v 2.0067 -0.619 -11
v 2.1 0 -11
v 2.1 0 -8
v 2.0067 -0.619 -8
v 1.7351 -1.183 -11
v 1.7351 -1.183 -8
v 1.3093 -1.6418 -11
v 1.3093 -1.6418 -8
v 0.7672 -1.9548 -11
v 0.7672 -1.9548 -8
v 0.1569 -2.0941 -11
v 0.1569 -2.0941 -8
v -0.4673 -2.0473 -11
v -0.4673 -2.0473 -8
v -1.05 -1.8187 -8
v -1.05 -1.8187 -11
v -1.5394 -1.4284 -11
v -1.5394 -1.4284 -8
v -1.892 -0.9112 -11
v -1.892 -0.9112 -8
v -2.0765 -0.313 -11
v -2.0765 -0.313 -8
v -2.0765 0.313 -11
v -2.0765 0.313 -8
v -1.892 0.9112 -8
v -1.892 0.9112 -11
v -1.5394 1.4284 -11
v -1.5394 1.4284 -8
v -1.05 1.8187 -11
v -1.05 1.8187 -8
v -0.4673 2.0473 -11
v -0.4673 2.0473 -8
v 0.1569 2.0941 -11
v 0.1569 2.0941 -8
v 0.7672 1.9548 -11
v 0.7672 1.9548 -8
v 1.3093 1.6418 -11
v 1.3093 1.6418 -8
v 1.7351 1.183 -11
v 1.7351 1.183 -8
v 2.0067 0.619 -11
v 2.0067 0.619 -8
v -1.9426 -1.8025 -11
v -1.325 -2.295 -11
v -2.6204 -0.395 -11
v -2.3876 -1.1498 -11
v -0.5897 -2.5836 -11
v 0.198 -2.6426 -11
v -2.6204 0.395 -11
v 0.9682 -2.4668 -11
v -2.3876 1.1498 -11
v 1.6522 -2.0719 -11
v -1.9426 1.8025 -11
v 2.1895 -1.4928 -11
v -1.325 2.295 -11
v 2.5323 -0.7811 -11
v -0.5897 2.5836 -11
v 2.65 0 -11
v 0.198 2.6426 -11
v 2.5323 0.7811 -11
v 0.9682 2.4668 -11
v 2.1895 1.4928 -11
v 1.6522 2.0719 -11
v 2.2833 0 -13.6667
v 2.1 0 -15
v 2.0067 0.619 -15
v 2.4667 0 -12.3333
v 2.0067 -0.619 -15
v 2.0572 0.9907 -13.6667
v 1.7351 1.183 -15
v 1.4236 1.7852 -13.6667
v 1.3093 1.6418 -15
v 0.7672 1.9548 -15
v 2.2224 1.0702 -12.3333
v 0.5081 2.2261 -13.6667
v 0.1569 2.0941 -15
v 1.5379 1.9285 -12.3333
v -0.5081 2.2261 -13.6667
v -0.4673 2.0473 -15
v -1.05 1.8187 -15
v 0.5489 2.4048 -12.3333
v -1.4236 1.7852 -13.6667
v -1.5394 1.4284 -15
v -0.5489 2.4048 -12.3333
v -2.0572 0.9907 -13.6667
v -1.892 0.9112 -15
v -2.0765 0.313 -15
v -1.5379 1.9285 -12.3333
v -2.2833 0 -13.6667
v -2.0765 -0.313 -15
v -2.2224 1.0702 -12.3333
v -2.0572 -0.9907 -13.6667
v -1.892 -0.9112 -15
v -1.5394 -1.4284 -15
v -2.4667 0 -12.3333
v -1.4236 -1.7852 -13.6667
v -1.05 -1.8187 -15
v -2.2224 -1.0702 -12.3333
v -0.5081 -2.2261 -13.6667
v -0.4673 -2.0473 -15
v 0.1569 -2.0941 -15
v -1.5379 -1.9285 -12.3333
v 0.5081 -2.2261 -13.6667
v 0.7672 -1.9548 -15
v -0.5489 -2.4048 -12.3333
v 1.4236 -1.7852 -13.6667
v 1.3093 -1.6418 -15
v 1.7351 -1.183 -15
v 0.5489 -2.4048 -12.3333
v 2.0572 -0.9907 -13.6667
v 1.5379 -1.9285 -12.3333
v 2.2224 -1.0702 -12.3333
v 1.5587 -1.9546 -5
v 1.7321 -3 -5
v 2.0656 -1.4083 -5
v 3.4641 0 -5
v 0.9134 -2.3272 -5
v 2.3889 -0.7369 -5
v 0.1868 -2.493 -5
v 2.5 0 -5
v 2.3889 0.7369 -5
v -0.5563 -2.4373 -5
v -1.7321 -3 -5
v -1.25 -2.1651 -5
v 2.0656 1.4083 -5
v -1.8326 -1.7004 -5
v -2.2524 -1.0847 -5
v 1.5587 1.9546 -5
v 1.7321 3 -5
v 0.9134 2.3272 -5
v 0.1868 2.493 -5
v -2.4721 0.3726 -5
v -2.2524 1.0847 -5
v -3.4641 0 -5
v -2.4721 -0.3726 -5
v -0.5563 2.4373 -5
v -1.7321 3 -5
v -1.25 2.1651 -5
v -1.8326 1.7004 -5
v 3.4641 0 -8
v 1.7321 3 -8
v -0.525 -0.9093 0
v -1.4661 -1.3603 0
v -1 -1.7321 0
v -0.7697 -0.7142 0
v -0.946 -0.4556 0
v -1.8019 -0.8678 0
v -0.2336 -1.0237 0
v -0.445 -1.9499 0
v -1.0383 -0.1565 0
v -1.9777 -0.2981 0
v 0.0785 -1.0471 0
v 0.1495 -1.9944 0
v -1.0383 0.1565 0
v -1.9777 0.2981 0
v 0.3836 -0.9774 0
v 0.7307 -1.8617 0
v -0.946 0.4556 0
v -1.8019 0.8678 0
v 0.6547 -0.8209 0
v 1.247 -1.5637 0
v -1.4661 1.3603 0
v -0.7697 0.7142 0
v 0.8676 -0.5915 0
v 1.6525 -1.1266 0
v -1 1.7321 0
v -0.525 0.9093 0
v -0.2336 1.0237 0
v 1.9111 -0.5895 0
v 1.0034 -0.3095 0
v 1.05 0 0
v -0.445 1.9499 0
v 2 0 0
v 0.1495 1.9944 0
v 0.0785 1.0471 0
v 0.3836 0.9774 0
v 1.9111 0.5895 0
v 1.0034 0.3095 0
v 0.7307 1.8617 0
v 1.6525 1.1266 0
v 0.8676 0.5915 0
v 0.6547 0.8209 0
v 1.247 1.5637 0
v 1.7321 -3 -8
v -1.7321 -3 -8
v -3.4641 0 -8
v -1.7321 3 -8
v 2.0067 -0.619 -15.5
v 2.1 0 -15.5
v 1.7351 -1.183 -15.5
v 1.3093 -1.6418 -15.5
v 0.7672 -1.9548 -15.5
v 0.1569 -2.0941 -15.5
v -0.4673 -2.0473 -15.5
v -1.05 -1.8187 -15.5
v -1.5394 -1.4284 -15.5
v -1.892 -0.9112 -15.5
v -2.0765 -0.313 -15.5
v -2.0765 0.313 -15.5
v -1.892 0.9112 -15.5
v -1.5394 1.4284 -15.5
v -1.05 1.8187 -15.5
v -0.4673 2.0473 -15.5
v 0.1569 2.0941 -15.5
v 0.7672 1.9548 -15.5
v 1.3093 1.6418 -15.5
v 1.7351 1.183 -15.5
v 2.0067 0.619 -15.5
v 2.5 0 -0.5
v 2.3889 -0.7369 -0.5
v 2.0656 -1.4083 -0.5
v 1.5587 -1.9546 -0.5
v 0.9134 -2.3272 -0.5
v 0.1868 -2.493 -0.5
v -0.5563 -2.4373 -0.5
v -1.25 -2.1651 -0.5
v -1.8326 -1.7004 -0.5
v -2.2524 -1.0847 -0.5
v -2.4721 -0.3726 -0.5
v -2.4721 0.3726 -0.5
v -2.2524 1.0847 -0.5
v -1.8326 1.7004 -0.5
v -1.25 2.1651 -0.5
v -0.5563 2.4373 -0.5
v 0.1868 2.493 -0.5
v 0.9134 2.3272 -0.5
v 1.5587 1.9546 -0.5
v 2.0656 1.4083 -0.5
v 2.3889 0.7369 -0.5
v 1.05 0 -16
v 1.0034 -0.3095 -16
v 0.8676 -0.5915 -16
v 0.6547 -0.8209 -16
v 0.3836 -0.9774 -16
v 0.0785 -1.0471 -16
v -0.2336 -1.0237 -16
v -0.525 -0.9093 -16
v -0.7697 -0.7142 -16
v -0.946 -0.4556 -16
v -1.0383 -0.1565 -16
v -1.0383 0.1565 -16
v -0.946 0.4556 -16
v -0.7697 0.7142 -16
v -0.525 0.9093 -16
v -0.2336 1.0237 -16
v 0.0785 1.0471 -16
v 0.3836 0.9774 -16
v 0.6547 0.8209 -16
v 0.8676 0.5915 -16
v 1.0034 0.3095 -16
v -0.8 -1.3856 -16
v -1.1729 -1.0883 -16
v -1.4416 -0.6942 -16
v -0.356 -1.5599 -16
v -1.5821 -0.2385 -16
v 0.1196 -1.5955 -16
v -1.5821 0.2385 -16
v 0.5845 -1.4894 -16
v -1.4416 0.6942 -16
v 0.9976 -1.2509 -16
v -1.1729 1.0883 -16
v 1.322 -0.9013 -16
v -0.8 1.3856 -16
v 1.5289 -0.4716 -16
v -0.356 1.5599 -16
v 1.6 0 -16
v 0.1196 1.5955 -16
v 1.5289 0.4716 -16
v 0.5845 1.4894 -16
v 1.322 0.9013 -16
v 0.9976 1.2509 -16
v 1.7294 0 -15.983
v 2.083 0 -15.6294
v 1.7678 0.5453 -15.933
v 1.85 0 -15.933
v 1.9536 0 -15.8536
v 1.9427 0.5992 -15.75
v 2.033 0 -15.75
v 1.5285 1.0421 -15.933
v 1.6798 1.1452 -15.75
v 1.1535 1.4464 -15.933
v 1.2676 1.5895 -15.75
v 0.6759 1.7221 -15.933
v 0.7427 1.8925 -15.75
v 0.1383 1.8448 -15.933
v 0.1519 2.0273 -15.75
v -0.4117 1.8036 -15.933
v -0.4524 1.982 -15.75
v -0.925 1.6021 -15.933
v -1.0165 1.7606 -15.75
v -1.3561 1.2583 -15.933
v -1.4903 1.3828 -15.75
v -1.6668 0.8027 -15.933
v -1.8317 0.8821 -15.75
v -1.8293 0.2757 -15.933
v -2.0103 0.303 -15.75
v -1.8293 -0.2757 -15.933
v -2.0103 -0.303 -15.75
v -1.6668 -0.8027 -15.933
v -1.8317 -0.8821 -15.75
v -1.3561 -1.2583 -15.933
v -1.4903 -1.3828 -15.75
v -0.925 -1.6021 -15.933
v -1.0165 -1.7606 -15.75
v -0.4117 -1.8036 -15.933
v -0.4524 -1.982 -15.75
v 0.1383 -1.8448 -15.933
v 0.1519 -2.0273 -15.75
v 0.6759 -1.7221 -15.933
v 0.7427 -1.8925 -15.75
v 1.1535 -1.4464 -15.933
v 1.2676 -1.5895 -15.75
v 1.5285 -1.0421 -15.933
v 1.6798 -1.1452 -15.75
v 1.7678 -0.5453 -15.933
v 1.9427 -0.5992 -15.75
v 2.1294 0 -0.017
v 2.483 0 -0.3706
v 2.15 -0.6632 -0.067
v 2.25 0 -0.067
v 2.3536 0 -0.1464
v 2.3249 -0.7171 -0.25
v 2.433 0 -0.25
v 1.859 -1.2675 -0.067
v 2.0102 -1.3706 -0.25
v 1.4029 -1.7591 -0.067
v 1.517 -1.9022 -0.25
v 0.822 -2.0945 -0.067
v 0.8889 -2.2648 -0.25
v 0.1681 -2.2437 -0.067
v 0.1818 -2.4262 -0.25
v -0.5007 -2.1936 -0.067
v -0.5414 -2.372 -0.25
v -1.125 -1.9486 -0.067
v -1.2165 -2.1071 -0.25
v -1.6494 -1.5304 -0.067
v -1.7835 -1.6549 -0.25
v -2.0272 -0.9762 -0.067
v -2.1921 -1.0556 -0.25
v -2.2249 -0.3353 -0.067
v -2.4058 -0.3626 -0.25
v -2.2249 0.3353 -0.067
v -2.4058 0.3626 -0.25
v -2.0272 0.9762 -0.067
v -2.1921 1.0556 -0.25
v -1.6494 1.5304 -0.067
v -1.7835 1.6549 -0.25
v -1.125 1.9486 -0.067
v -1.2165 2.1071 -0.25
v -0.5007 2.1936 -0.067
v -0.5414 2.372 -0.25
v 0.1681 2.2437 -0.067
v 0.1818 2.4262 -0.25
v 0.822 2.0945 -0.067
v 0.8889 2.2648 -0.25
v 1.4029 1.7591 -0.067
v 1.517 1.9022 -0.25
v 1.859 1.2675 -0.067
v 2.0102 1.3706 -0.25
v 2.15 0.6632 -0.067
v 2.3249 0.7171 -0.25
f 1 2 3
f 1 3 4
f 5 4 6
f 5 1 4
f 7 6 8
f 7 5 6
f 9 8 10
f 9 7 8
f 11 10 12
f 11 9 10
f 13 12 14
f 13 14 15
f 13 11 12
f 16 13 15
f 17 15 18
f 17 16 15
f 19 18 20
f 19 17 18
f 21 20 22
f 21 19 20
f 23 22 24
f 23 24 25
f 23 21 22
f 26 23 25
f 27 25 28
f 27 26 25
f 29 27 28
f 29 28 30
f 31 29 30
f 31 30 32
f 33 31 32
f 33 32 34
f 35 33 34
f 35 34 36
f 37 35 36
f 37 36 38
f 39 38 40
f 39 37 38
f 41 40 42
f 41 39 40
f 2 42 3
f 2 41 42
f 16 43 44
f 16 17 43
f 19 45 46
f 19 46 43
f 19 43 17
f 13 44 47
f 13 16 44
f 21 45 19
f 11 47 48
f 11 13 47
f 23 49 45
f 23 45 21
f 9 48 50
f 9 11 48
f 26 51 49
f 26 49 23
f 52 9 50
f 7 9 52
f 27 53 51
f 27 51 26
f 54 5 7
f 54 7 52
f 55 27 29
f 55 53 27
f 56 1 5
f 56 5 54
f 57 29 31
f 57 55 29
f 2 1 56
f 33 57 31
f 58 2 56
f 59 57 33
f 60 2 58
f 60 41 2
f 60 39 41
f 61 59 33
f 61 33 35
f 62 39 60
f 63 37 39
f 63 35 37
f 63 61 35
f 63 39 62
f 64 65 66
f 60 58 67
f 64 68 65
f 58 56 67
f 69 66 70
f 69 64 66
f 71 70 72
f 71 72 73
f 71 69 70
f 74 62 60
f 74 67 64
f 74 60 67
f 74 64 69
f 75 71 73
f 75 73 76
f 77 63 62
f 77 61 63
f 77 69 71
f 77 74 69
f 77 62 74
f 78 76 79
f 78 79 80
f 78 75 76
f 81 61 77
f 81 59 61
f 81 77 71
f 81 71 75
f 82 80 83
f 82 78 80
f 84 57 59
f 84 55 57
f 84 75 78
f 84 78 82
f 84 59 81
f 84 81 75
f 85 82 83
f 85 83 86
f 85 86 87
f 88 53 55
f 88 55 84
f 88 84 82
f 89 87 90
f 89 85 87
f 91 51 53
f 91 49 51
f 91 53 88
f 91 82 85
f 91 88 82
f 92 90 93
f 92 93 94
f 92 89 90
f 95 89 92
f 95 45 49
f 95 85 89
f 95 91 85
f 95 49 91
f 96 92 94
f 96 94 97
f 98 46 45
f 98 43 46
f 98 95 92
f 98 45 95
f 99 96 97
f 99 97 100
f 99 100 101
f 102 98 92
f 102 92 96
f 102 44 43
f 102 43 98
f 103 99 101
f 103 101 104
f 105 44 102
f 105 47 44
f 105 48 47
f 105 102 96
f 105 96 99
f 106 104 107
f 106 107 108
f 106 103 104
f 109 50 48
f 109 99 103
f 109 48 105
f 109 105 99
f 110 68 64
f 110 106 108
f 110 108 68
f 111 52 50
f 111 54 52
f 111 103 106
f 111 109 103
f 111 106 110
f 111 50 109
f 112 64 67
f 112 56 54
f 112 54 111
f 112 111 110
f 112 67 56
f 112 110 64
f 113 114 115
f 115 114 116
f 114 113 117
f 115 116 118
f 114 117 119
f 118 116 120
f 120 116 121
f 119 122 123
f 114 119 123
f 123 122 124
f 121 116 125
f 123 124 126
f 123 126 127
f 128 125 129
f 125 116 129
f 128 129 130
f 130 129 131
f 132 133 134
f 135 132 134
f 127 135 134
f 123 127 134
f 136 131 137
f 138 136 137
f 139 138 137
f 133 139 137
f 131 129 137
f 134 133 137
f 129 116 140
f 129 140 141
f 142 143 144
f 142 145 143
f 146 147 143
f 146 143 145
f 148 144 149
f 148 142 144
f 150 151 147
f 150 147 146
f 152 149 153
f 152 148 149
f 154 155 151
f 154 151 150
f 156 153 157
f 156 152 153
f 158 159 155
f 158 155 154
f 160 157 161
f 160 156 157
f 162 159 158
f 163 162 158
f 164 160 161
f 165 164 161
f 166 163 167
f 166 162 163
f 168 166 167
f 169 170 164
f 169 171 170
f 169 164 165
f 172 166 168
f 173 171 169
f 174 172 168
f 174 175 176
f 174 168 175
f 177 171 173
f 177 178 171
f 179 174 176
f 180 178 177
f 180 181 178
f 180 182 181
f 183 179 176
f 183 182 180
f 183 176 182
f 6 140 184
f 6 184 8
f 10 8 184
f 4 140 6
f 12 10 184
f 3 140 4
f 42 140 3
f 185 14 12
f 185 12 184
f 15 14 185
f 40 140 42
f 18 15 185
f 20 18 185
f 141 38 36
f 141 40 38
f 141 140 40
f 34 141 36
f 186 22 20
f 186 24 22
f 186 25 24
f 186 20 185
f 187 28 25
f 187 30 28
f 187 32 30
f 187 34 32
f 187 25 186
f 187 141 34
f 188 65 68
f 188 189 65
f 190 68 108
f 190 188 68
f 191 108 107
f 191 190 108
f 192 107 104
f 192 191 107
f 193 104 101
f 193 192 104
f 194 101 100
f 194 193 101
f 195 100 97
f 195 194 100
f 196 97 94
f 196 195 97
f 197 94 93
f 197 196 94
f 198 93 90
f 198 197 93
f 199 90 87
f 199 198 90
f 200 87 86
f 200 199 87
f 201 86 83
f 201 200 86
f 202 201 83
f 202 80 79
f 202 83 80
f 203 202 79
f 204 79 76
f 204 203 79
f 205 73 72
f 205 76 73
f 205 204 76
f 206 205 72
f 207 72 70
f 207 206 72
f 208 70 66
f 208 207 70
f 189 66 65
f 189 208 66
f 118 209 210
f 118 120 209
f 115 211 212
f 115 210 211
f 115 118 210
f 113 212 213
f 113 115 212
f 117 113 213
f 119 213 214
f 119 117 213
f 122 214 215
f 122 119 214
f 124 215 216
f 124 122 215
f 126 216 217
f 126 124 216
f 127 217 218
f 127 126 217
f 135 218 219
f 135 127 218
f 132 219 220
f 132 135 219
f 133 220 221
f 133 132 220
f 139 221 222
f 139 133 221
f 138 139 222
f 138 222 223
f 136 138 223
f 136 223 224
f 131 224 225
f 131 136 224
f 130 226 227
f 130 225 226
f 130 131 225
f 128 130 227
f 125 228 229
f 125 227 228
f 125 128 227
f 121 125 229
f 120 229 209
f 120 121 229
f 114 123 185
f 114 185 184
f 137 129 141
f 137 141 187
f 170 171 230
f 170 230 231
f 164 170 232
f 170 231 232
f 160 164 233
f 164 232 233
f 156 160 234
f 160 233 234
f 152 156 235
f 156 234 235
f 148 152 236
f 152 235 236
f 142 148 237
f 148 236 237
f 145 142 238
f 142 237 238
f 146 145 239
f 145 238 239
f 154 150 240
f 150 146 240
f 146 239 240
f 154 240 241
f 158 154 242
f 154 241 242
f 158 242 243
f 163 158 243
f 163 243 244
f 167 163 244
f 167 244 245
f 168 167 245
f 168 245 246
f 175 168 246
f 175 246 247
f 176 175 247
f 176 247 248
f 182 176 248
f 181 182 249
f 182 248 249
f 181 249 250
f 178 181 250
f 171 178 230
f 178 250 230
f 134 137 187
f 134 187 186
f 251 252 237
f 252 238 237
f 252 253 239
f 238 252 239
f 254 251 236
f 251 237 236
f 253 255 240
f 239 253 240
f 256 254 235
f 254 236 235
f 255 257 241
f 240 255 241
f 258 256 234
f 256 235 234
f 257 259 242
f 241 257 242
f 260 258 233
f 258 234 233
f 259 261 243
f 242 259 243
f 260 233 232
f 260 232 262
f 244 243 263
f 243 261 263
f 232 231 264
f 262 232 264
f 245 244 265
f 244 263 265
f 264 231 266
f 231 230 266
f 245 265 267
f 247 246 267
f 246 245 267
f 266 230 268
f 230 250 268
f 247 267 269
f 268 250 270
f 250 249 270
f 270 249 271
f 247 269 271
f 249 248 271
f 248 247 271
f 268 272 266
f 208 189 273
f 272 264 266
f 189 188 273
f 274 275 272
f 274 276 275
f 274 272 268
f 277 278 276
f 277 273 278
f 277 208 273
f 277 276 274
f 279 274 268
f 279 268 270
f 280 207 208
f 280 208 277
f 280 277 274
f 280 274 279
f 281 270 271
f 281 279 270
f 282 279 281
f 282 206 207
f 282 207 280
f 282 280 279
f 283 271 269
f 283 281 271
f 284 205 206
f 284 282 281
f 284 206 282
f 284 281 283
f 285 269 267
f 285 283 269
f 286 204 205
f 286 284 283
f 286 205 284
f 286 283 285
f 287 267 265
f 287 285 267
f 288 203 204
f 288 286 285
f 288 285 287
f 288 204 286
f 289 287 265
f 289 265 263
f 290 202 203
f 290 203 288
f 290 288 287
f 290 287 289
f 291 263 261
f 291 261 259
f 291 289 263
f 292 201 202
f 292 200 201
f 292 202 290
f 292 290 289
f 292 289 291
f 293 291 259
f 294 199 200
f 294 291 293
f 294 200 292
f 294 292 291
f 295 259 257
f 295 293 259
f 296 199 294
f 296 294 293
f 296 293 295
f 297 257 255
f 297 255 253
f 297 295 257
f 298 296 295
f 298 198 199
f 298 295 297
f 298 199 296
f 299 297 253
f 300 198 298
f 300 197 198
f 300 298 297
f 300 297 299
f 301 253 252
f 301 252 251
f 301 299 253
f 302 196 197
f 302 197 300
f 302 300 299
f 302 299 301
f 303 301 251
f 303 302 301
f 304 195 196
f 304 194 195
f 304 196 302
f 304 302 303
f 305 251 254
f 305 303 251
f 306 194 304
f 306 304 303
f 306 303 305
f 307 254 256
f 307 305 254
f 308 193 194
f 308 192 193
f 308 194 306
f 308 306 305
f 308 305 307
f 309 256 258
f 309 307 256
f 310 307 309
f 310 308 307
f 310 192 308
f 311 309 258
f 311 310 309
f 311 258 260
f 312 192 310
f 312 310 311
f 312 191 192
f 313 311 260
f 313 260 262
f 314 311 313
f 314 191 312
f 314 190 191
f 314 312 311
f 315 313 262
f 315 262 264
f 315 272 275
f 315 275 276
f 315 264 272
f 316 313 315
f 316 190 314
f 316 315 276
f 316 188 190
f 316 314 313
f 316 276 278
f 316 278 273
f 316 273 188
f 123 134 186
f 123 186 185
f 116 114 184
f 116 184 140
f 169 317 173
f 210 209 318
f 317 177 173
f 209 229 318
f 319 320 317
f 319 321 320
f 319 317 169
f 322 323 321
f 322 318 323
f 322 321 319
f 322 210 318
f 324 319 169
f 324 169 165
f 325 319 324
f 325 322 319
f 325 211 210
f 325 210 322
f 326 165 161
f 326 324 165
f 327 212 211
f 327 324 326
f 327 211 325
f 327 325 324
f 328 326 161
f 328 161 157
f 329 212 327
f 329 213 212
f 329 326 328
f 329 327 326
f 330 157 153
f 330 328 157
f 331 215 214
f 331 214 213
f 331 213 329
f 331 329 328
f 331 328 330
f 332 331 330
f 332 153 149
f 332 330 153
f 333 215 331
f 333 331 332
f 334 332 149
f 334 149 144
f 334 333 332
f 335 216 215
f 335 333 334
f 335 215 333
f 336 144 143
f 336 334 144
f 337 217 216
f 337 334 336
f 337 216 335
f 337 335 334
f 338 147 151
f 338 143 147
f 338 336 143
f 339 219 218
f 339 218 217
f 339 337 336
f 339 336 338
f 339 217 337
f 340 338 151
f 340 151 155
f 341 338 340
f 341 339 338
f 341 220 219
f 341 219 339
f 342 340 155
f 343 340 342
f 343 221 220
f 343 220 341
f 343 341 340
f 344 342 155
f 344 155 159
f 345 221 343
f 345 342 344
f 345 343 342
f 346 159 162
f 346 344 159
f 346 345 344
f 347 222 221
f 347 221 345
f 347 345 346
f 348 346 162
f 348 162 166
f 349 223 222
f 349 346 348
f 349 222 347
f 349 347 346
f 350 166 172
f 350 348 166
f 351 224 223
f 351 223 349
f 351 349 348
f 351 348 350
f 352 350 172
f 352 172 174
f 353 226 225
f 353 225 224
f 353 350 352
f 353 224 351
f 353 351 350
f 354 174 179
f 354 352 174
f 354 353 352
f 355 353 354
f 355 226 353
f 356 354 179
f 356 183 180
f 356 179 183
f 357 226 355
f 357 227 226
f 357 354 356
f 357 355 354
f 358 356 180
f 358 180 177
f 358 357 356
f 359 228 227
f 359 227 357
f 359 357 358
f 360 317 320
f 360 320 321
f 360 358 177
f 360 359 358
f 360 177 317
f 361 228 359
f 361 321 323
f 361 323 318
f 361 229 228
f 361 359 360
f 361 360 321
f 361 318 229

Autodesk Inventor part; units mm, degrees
ref_plane "YZ Plane" through (0, 0, 0) normal (1, 0, 0) x (0, 1, 0)
ref_plane "XZ Plane" through (0, 0, 0) normal (0, 1, 0) x (-1, 0, 0)
ref_plane "XY Plane" through (0, 0, 0) normal (0, 0, 1) x (1, 0, 0)
sketch "Sketch1" plane through (0, 0, 0) normal (0, 1, 0) x (-1, 0, 0)
  line L0 (-1.05, 0) -> (-2.5, 0)
  line L1 (-2.5, 0) -> (-2.5, -5)
  line L2 (-2.5, -5) -> (-2.1, -5)
  line L3 (-2.1, -5) -> (-2.1, -16)
  line L4 (-2.1, -16) -> (-1.05, -16)
  line L5 (0, -19.2) -> (0, 3.2) projected
  line L6 (-1.05, 0) -> (-1.05, -16)
  line L7 (-2.1, -11) -> (-2.65, -11)
  line L8 (-2.65, -11) -> (-2.1, -15)
  point P0 (0, 0)
  dimension "d0" = 11
  dimension "d1" = 5
  dimension "d3" = 1.05
  dimension "d4" = 2.5
  dimension "d14" = 2.1
  dimension "d15" = 2.65
  dimension "d19" = 1
  dimension "d20" = 4
revolve "Revolution1" add sketch "Sketch1" angle 360 about axis through (0, 0, -10) along (0, 0, 1)
fillet "Fillet2" radius 0.5 2 edges at (-2.5, 0, 0) (-2.1, 0, -16)
sketch "Sketch3" plane through (0, 0, -5) normal (0, 0, -1) x (-1, 0, 0)
  line L0 (3.4641, 0) -> (1.7321, -3)
  line L1 (1.7321, -3) -> (-1.7321, -3)
  line L2 (-1.7321, -3) -> (-3.4641, 0)
  line L3 (-3.4641, 0) -> (-1.7321, 3)
  line L4 (-1.7321, 3) -> (1.7321, 3)
  line L5 (1.7321, 3) -> (3.4641, 0)
  circle A0 centre (0, 0) radius 1.05
  dimension "d21" = 6
extrude "Extrusion2" add sketch "Sketch3" along normal blind 3
properties part number "Suction_electrode_cap_side_dk"
